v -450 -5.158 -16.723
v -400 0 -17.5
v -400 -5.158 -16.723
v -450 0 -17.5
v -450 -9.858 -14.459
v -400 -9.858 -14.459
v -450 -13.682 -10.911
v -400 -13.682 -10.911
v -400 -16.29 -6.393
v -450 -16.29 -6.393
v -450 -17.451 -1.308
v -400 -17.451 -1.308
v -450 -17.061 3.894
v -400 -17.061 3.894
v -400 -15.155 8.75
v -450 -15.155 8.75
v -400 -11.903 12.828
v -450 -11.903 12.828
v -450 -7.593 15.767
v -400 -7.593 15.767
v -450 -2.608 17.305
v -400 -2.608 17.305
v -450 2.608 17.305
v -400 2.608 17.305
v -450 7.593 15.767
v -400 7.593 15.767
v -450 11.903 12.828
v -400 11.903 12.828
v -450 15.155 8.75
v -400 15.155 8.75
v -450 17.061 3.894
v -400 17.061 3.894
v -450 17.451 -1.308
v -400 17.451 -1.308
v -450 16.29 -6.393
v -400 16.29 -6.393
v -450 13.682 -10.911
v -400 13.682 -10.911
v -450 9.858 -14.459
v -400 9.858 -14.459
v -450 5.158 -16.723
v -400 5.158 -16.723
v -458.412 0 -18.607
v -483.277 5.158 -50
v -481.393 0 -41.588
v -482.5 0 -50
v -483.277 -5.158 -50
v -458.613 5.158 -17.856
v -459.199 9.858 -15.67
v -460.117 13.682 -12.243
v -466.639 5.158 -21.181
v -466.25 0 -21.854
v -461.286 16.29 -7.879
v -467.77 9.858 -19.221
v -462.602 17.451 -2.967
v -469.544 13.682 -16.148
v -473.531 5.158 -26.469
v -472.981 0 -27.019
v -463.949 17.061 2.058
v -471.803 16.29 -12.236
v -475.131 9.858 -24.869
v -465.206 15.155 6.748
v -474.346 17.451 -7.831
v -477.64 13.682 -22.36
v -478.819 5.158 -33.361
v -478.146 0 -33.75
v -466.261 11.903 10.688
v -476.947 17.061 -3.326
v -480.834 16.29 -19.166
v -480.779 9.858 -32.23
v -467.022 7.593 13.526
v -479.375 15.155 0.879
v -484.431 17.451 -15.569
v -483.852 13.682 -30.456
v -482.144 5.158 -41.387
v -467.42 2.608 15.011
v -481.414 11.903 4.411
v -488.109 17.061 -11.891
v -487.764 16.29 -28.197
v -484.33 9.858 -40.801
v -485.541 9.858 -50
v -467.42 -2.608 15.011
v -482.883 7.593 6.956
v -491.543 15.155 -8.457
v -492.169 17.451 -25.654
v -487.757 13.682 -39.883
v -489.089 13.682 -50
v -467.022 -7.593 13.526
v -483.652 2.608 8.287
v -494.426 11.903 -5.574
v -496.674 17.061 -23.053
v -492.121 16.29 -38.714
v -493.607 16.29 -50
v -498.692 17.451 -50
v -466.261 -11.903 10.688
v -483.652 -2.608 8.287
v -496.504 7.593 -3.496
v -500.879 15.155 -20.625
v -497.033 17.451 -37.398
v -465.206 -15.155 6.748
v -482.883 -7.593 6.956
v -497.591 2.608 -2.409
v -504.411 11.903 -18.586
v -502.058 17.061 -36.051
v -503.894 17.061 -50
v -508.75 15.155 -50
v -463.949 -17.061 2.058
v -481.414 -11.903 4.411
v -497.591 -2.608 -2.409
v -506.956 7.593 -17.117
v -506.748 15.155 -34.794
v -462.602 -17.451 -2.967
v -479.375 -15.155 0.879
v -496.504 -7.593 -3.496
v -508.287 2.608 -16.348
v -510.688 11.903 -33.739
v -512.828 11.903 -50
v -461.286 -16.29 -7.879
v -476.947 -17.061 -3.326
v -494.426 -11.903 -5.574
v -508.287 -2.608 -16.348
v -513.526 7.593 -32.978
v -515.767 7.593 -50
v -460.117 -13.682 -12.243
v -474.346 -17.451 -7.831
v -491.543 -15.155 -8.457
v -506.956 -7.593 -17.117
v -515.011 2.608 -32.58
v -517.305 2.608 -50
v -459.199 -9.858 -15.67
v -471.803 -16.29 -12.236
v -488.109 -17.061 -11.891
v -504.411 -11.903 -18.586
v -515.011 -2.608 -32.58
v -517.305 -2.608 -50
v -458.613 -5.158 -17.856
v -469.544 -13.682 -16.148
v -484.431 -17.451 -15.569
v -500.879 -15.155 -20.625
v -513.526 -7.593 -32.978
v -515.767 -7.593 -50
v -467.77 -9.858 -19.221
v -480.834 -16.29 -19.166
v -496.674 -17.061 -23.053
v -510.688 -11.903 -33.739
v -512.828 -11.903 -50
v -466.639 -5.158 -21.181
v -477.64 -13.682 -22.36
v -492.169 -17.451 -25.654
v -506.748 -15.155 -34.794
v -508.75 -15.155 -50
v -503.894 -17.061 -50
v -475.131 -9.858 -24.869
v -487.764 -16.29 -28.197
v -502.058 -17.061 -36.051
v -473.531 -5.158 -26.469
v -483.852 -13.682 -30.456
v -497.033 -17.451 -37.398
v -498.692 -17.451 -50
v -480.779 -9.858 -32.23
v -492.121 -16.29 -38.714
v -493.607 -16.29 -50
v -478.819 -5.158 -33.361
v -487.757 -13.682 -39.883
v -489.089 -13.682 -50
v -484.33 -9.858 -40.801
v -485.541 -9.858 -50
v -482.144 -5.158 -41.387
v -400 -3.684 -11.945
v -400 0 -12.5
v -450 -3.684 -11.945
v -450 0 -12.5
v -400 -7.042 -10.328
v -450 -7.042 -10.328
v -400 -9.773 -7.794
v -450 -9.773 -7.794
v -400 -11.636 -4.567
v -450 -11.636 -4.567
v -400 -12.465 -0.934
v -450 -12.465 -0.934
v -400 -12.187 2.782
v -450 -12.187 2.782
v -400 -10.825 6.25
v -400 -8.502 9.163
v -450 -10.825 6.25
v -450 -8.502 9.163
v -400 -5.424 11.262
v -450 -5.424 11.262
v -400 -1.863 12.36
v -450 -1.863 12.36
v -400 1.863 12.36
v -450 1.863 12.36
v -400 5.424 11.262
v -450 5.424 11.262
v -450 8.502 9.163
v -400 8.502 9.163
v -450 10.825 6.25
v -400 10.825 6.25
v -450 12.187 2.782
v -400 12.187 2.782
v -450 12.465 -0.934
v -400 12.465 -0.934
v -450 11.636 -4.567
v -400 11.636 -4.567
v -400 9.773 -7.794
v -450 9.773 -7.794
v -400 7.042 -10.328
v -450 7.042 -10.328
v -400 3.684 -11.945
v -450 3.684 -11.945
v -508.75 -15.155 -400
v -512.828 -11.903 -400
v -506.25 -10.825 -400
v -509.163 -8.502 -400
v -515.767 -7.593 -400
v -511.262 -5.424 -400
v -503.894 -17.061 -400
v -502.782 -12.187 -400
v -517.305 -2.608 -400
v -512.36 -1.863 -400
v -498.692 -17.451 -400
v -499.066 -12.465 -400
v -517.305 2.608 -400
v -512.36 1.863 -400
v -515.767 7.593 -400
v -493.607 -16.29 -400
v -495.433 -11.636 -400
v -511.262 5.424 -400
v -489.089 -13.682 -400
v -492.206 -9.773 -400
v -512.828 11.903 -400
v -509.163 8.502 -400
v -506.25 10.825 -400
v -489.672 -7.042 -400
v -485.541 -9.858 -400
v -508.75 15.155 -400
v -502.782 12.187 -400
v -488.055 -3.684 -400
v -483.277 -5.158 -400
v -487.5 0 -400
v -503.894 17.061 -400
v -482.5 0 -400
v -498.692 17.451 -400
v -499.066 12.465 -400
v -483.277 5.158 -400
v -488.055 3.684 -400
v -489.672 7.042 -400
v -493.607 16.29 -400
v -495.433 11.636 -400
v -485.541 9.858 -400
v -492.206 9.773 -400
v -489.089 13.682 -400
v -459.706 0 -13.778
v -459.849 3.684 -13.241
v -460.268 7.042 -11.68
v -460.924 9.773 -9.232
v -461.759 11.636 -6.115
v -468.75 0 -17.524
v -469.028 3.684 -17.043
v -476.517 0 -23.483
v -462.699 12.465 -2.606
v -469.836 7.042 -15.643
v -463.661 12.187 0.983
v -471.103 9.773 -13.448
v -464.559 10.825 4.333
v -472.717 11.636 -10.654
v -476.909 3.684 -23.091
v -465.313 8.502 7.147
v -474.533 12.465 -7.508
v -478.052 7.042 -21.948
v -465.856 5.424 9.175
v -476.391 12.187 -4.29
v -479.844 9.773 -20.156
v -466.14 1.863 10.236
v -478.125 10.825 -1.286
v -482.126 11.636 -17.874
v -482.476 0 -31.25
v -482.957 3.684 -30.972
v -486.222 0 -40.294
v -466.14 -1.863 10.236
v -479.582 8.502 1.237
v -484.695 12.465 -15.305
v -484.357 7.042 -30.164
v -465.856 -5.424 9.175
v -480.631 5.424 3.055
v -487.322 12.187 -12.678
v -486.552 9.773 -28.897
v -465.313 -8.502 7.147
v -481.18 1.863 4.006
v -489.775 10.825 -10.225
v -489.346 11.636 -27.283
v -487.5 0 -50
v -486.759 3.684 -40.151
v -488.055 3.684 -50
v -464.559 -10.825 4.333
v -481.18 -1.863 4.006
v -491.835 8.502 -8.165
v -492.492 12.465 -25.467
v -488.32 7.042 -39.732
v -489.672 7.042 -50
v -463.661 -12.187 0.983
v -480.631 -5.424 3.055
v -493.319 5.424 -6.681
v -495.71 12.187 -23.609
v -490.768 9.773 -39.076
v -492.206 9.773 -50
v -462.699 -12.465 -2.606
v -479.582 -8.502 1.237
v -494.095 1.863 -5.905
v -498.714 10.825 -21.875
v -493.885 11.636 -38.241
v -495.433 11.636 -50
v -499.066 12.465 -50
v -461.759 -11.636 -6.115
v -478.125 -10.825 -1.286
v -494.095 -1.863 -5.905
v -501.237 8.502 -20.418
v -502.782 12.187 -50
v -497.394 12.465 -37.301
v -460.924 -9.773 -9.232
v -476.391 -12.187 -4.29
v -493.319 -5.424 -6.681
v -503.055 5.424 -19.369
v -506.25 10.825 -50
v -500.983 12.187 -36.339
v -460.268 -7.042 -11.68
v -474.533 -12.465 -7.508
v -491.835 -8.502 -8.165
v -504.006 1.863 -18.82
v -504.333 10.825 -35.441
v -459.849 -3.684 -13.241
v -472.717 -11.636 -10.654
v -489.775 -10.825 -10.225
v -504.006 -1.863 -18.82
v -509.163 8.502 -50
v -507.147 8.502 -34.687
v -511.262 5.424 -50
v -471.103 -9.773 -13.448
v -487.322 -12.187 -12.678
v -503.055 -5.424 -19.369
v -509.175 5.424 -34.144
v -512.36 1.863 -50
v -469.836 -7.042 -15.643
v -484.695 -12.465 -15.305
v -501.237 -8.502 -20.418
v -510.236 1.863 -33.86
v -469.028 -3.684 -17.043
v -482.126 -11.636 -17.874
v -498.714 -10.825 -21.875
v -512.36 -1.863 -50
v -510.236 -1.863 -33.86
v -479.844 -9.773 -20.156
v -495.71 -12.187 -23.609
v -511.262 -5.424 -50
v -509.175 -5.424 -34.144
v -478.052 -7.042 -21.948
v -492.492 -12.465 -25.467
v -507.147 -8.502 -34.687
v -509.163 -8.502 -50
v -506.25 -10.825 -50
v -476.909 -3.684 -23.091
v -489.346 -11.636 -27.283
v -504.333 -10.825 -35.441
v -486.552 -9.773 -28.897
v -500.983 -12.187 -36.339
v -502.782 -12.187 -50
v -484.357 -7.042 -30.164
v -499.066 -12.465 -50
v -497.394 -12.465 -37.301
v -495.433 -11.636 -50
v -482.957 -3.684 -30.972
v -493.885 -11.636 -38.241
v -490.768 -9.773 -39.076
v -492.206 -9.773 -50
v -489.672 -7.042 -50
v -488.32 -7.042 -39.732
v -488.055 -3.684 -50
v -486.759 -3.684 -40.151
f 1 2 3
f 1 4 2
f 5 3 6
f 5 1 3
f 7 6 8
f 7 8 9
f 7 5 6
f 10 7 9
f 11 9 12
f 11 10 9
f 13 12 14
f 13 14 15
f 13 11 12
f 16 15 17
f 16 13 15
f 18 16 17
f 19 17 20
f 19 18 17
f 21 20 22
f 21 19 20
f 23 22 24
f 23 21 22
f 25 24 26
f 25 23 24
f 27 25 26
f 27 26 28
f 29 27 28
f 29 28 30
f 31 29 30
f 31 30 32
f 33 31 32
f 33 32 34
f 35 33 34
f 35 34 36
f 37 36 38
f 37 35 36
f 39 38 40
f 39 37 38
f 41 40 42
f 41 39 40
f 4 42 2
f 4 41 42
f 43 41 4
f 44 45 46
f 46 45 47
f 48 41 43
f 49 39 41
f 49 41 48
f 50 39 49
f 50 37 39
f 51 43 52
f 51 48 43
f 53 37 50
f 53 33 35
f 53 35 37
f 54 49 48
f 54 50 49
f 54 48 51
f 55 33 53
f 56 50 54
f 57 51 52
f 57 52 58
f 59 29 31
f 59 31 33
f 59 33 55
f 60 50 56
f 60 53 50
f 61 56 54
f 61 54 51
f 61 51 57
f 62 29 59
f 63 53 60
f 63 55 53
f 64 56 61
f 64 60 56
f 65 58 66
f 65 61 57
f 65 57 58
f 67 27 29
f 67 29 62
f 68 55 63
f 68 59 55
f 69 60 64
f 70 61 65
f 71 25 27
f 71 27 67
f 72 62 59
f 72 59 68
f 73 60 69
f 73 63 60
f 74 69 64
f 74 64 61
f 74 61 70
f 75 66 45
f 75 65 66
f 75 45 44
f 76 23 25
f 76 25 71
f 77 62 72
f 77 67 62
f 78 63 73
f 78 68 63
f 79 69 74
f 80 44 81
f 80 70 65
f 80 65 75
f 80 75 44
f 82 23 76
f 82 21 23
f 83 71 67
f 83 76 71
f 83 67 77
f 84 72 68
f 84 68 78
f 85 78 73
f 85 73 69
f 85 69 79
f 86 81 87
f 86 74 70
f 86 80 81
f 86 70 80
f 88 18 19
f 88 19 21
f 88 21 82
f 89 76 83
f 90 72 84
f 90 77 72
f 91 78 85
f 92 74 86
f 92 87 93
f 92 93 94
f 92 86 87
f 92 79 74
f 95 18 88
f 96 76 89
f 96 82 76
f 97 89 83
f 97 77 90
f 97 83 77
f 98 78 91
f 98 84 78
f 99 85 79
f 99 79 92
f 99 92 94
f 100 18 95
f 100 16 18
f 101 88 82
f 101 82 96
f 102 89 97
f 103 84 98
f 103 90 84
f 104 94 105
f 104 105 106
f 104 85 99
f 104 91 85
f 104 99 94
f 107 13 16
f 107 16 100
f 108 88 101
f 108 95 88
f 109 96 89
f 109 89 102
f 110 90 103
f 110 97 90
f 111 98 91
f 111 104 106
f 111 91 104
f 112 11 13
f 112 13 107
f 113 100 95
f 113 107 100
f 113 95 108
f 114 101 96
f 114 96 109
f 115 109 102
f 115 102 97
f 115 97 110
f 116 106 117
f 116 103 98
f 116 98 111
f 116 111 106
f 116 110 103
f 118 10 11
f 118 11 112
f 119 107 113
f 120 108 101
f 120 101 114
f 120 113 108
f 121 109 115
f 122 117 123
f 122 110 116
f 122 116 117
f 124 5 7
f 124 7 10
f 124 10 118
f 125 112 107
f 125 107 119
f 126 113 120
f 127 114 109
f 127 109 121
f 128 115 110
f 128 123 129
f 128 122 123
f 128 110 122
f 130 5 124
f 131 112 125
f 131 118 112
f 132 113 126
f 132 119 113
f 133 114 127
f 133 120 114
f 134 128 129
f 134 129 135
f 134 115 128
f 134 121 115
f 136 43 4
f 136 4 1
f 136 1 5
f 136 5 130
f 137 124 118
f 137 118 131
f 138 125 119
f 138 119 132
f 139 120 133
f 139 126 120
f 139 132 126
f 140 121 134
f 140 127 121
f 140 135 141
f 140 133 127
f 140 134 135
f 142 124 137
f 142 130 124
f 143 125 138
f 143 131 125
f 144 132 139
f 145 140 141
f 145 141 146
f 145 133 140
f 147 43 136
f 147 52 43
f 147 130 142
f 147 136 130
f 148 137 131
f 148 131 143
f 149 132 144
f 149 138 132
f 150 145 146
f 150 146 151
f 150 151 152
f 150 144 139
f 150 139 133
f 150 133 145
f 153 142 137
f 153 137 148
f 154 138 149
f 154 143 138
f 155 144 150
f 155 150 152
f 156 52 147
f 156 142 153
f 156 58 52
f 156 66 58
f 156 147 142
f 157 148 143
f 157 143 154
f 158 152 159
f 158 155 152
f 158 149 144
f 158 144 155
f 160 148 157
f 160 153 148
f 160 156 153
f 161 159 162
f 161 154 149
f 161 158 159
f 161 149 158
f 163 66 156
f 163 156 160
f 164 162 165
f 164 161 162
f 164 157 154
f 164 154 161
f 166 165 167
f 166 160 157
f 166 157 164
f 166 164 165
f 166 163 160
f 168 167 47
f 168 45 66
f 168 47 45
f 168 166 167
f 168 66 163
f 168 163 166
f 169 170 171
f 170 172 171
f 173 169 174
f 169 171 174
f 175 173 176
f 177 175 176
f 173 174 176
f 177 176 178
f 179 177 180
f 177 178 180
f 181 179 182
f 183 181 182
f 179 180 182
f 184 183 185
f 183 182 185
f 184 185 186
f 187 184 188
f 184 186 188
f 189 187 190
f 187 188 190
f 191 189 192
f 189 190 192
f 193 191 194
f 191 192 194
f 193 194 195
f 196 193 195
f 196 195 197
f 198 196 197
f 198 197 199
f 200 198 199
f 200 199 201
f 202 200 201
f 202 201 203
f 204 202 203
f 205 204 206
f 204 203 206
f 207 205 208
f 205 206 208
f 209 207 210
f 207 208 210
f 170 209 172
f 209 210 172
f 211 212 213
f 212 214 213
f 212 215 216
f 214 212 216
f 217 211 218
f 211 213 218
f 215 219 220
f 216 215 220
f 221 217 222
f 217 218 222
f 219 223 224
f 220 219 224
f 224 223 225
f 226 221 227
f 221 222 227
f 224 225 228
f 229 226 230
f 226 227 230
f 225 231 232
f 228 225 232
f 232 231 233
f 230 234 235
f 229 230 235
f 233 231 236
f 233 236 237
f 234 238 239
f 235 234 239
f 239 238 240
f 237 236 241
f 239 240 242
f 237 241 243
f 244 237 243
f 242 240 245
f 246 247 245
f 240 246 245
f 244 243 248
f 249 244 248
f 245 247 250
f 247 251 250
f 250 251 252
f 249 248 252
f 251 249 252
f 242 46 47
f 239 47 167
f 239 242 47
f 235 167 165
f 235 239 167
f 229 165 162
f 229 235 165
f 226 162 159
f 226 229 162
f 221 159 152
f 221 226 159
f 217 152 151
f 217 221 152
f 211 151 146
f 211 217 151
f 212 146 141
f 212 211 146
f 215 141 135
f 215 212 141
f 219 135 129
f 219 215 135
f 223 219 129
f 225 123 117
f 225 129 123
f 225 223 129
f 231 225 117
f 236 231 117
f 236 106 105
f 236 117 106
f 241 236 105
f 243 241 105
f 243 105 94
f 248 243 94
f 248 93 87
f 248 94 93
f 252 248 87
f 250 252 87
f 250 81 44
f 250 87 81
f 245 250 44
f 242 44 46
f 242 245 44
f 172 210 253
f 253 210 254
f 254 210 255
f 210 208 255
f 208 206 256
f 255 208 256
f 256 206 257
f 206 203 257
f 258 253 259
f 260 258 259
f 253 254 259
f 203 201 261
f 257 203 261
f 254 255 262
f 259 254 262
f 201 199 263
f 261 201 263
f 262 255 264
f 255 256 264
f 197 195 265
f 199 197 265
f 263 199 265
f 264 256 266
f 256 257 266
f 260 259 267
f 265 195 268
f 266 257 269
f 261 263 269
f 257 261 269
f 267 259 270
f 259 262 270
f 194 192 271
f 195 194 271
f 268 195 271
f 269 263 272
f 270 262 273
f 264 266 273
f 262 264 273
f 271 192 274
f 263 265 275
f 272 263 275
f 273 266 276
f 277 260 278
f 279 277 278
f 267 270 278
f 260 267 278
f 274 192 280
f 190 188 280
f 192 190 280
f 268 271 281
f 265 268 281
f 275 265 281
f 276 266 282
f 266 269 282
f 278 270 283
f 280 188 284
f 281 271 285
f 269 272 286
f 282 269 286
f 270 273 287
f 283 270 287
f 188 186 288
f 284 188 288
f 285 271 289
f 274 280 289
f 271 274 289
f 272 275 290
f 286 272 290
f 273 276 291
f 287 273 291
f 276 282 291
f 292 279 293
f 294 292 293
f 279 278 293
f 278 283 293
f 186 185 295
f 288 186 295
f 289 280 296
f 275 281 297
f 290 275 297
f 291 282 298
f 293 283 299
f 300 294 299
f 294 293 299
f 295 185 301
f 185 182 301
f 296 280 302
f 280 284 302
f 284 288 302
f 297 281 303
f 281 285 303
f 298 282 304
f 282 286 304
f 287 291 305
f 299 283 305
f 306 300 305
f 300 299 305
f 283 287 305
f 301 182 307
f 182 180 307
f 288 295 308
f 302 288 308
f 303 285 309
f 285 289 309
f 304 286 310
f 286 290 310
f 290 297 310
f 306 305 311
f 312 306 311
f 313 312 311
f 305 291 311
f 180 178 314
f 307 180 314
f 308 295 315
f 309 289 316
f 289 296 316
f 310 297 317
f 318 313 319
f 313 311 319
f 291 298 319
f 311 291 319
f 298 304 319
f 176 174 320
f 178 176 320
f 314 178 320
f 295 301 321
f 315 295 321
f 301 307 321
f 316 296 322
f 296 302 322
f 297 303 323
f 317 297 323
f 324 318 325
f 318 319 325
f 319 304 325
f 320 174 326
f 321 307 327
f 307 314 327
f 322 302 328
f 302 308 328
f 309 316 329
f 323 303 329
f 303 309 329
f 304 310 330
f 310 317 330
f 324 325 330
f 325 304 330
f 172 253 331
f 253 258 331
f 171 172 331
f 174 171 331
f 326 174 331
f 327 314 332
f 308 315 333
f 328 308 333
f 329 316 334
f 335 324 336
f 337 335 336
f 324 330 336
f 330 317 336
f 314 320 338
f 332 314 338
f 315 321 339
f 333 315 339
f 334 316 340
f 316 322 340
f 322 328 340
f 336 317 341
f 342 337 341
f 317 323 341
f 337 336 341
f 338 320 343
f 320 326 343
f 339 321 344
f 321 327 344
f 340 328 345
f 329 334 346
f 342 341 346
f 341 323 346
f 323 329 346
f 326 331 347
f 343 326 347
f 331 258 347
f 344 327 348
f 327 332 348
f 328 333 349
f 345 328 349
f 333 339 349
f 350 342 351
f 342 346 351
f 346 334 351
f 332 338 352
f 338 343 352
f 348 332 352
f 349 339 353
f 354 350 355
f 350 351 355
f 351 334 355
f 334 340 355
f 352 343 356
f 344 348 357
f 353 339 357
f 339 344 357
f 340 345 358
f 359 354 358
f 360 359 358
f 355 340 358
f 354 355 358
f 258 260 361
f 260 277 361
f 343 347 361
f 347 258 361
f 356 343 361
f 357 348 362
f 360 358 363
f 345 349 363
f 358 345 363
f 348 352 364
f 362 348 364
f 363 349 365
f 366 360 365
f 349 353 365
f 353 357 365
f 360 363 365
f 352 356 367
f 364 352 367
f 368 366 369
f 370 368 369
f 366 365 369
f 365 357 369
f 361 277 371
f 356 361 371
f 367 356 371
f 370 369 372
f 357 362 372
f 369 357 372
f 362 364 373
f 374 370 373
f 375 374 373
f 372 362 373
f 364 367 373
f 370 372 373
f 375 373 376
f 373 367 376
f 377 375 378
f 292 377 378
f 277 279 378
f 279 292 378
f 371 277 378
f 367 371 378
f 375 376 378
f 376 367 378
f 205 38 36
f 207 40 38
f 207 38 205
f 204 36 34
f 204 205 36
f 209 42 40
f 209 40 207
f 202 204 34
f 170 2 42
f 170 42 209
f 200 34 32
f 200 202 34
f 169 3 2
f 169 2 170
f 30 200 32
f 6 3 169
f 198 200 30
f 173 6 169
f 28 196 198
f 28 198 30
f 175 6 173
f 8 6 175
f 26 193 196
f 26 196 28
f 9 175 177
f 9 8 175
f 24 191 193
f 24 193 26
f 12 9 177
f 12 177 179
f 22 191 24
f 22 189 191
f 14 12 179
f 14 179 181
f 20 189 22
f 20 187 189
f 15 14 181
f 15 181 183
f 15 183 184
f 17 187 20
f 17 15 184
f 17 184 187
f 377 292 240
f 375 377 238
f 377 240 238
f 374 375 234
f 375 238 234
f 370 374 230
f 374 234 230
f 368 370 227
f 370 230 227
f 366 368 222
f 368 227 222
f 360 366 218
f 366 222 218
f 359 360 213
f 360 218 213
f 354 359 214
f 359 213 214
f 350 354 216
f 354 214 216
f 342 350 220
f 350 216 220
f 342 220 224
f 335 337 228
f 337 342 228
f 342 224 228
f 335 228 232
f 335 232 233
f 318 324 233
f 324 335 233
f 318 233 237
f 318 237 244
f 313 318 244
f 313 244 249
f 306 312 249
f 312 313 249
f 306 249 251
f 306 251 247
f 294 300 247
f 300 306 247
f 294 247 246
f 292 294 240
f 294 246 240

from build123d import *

# Parameters (mm, degrees)
SKETCH_1_R                      = 17.5
SKETCH_1_R_2                    = 12.5
CUT_EXTRUDE_3_REACH             = 483.521
SKETCH_3_R                      = 17.5
SKETCH_3_R_2                    = 12.5
CUT_EXTRUDE_3_DIRECTION_2_DEPTH = 150


with BuildPart() as part:
    # 扫描1: sweep along a path in 草图2
    with BuildLine(Plane(origin=(0, 0, 0), x_dir=(1, 0, 0), z_dir=(0, 1, 0))) as sweep_1_path:
        Line((0, 0), (-450, 0))
        ThreePointArc((-450, 0), (-485.355339059, 14.644660941), (-500, 50))
        Line((-500, 50), (-500, 400))
    # 草图1 → 扫描1 (sweep)
    with BuildSketch(Plane(origin=(0, 0, 0), x_dir=(0, 0, -1), z_dir=(1, 0, 0))):
        Circle(SKETCH_1_R)
        Circle(SKETCH_1_R_2, mode=Mode.SUBTRACT)
    sweep(path=sweep_1_path.line)

    # 草图3 → 切除-拉伸3 (cut, up to next)
    with BuildSketch(Plane(origin=(-250, 0, 0), x_dir=(0, 0, -1), z_dir=(1, 0, 0)), mode=Mode.PRIVATE) as cut_extrude_3_sk1:
        Circle(SKETCH_3_R)
        Circle(SKETCH_3_R_2, mode=Mode.SUBTRACT)
    cut_extrude_3_tool1 = extrude(cut_extrude_3_sk1.sketch, amount=CUT_EXTRUDE_3_REACH, mode=Mode.PRIVATE) & part.part
    add(cut_extrude_3_tool1.solids().sort_by_distance((-250, 0, 17.005025))[0], mode=Mode.SUBTRACT)

    # 草图3 → 切除-拉伸3 direction 2 (cut)
    with BuildSketch(Plane(origin=(-250, 0, 0), x_dir=(0, 0, -1), z_dir=(1, 0, 0))):
        Circle(SKETCH_3_R)
        Circle(SKETCH_3_R_2, mode=Mode.SUBTRACT)
    extrude(amount=-CUT_EXTRUDE_3_DIRECTION_2_DEPTH, mode=Mode.SUBTRACT)


solid = part.part
